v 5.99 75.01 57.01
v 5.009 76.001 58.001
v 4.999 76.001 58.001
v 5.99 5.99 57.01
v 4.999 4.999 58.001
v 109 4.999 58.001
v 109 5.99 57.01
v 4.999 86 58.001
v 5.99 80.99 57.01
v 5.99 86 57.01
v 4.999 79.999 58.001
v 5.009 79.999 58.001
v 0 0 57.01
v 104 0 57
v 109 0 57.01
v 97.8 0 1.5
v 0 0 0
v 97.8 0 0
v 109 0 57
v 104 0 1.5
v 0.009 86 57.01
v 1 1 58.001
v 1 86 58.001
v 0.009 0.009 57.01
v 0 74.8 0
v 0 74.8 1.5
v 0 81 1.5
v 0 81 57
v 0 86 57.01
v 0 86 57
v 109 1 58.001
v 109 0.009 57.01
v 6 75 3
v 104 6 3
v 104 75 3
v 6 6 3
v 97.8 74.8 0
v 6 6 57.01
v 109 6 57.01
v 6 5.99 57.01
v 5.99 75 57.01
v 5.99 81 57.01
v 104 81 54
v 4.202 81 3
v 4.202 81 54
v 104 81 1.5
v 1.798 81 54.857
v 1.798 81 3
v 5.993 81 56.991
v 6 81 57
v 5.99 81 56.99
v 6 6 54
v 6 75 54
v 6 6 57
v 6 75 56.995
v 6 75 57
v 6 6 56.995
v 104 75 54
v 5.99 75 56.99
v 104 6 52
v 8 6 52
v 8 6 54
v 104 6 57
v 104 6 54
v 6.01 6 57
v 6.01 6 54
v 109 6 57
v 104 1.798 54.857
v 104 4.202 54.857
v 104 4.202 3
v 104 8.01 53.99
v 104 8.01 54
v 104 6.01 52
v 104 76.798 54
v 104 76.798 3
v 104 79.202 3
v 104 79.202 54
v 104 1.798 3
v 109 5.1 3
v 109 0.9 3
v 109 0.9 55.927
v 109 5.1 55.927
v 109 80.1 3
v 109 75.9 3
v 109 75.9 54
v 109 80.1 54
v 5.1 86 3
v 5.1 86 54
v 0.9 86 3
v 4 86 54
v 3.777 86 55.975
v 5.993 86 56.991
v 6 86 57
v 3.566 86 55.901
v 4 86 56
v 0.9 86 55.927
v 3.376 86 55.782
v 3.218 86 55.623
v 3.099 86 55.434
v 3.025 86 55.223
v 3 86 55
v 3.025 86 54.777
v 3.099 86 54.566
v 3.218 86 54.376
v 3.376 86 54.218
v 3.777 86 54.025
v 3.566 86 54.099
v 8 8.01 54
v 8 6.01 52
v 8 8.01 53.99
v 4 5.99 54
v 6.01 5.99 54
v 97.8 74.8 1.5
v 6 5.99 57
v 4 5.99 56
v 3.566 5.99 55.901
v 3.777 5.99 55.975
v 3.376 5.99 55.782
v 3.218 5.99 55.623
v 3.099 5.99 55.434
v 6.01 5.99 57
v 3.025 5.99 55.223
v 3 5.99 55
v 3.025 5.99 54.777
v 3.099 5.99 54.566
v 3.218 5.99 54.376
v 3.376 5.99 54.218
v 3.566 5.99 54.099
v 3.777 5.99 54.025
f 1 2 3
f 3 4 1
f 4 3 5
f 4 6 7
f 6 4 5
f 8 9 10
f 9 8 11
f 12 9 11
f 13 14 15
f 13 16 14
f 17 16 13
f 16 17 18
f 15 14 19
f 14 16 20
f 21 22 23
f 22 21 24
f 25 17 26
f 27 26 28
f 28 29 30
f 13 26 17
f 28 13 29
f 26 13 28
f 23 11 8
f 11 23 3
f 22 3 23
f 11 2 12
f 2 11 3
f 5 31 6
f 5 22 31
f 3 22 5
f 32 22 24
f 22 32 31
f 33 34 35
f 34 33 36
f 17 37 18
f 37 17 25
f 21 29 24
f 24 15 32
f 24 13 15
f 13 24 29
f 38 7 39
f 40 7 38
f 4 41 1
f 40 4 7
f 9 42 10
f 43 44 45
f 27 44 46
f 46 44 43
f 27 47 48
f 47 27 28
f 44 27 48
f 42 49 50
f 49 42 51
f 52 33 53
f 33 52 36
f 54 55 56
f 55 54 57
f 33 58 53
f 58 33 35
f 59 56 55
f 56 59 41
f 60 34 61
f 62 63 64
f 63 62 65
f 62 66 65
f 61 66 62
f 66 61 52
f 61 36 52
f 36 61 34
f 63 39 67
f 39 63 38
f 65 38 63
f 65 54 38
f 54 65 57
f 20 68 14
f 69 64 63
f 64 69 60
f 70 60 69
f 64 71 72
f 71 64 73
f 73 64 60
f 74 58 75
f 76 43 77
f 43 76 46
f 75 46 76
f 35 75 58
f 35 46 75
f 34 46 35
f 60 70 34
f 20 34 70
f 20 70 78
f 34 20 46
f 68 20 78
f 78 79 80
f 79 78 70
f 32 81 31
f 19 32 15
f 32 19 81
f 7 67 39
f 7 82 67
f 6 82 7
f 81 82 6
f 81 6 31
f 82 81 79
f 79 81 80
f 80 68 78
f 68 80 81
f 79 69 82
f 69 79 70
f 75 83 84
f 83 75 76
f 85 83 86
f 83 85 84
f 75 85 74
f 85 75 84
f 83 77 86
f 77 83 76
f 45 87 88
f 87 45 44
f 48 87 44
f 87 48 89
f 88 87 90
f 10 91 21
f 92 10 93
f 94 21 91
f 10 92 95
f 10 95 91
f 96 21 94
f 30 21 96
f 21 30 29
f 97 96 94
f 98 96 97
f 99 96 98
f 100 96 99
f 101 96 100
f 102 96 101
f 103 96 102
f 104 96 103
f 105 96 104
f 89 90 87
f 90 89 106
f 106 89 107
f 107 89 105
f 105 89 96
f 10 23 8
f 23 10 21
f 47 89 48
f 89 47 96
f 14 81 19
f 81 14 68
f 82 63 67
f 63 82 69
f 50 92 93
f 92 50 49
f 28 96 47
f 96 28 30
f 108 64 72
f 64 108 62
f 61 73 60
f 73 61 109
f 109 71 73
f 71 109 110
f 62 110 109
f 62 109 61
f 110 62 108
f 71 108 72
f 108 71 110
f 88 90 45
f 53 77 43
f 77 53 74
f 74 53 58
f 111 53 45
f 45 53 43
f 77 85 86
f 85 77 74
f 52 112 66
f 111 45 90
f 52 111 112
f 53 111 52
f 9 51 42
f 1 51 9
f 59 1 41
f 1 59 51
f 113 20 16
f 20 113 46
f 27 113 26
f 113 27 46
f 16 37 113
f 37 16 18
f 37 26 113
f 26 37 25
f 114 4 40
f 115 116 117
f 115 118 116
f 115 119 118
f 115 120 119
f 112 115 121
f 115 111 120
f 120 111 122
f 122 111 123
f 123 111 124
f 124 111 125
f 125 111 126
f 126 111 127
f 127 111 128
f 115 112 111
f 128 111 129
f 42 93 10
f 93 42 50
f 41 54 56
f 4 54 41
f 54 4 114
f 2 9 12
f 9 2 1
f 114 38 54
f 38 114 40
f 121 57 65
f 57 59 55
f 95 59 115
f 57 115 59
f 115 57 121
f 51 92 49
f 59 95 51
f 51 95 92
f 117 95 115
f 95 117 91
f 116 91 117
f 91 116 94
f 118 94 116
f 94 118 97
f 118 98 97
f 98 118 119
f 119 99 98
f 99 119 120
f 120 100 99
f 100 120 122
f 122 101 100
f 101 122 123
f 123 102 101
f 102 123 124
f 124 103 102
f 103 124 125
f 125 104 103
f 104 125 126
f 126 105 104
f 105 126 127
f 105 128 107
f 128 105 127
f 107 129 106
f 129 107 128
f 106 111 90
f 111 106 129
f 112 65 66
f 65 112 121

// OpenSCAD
// ============================================================================
// cutlery_box.scad
// Graduated 3-chamber disposable-cutlery box (Option 3) — CUT-FROM-SOLID port
// of build_box.py, for a 120 x 120 x 120 mm printer (AOSEED).
//
// WHY THIS PORT EXISTS (the whole point):
//   The hand-mesh generator (build_box.py) could not keep the 1 mm rim chamfer
//   continuous across the female dovetail joints, because where a slot's flared
//   corner crosses the sloped chamfer it needs a true boolean intersection.
//   OpenSCAD HAS that boolean kernel, so here we do exactly the "cut-from-solid"
//   thing:
//      1. Build the ENTIRE box as ONE solid, WITH the chamfer already on it.
//      2. difference() out vertical dovetail prisms ( /_\ cross-section ),
//         running from just above the base plate up THROUGH the rim, to both
//         (a) form the sliding-dovetail joints, and
//         (b) split the box into 6 bed-sized pieces.
//   Because the cut is a real boolean through the already-chamfered solid, the
//   sloped chamfer<->slot edge is produced for free => the rim chamfer stays
//   CONTINUOUS across every joint, with none of the sliver hacks.
//
// ----------------------------------------------------------------------------
// HOW TO USE
//   In the app:  set `part` below (or use the Customizer dropdown), F5 to
//                preview, F6 to render, then File > Export > STL.
//   One piece (CLI):
//      openscad -o body_knife_A.stl -D 'part="knife_A"' cutlery_box.scad
//   ALL SIX (bash, run from this folder):
//      for p in knife_A knife_B fork_A fork_B spoon_A spoon_B; do \
//        openscad -o "body_$p.stl" -D "part=\"$p\"" cutlery_box.scad ; done
//   PNG preview of one piece:
//      openscad -o knife_B.png --imgsize=1400,1000 --autocenter --viewall \
//        -D 'part="knife_B"' cutlery_box.scad
//
//   Pieces are modelled in ASSEMBLED coordinates (floor-down, z=0 is the bed),
//   so importing all six STLs together shows the assembled box directly; your
//   slicer will auto-drop each one onto the plate for printing.
//
// BED SANITY: every piece is <= 120 mm in X, Y, Z.
//   Z = 58 mm. Widest piece = spoon at 117 mm (Y). A-halves reach 109 mm (X,
//   including the protruding dovetail key). All under 120.
//
// !! I could NOT run OpenSCAD to verify this file (no binary in my sandbox) !!
//   - The rim chamfer is a SMOOTH, true-45 bevel built from hull() frustums of
//     convex rectangles. Works in every OpenSCAD since ~2015 (incl. Homebrew
//     2021.01). No stepped staircase -- and, crucially, it makes box() a clean
//     well-formed solid so the per-part booleans resolve reliably (the old
//     14-slice staircase was fragile and CGAL was dropping the walls of the
//     interior parts, leaving only the key prisms => "floating boxes").
//   - roof() is still available behind USE_ROOF=true for those who have it
//     (2021.01+ snapshots); for THIS rectangular design it is identical, so it
//     is NOT required.
//   - After F6, check the console for "WARNING"/"not a valid 2-manifold".
//     If a tenon ever looks detached, bump EPS to 0.05.
// ============================================================================


/* [Part to render / export] */
part = "knife_A"; // [knife_A, knife_B, fork_A, fork_B, spoon_A, spoon_B, assembly]

/* [Chamfer method] */
// false = smooth hull() frustum bevel (default, any OpenSCAD); true = roof() (2021.01+)
USE_ROOF = false;

/* [Heights (mm)] */
BASE   = 3.0;     // floor / base-plate thickness
COMP_H = 55.0;    // interior wall height above the floor (cutlery stack depth)

/* [Walls (mm)] */
HOST_T   = 6.0;     // thickness of every wall (thick enough to host a dovetail)
HALF_LEN = 104.0;   // printed length of each half (A = near, B = far); <120 incl. key

/* [Chamber bays (mm)] */
N_COL     = 3;       // columns of cutlery per chamber
KNIFE_COL = 23.0;    // -> knife bay 69  (3 x 19 mm knives + play)
FORK_COL  = 33.0;    // -> fork  bay 99  (3 x 29 mm forks  + play)
SPOON_COL = 37.0;    // -> spoon bay 111 (3 x 34 mm spoons + play, trimmed <120)

/* [Dovetail joint (mm)] */
DT_DEPTH = 5.0;   // tail protrusion past the seam (male key depth)
DT_NECK  = 1.2;   // half-width at the seam face (narrow)
DT_FLARE = 2.1;   // half-width at the tip (wide -> locks)
DT_CLR   = 0.4;   // FLANK/seam slide clearance added to the female socket (do not change for fit)
DT_DEPTH_RELIEF = 0.3; // extra depth on the socket BACK only, so the tail tip never bottoms out

/* [Hidden-dovetail top cap / "hat" (mm)] */
// The dovetail otherwise shows its trapezoid outline on the TOP edge of the wall.
// To hide it, the MALE piece extends the wall's full-width top (chamfer included)
// across the key footprint -> a flush, continuous top. The FEMALE piece gets a
// matching top RECESS (cap footprint + CAP_CLR) so the cap drops straight in.
// Result: the top reads as one surface with a single straight seam line at the cap
// tip; the dovetail joinery lives entirely below the cap.
//
// SELF-SUPPORTING UNDERSIDE: the cap reaches the FULL wall width at the chamfer base
// (so the top edge reads as the wall extended, with NO recessed sliver on the outer
// face), and its underside is ONE planar ramp from the chamfer's OUTER CORNER
// (half-width HOST_T/2 at z = BODY_H-CHAMFER) down to the dovetail-neck half-width
// (CAP_FOOT) at CAP_SLANT_DEG from horizontal. No little horizontal step. The ramp
// reaching full width exactly at the chamfer base means "ramp top" == "chamfer base"
// (CAP_H is DERIVED). The FEMALE recess is the same ramp + CAP_CLR play.
// TRADEOFF: because the cap runs all the way to the outer corner, the female wall
// tapers to ~0 at z = BODY_H-CHAMFER -> a thin feather edge at the joint (gradual at
// CAP_SLANT_DEG, hidden inside the joint when assembled). Accepted per design intent.
CAP_SLANT_DEG = 50;     // cap underside ramp angle from horizontal (50 = self-supporting, long flare)
CAP_FOOT = DT_NECK;     // cap-underside half-width where it meets the dovetail neck
CAP_CLR = 0.3;          // slide clearance so the male cap seats into the female top recess

/* [Rim chamfer (mm)] */
CHAMFER = 1.0;    // 45-deg comfort break broken along the top wall edges

/* [Base half-lap / anti-warp (mm)] */
// Neighbouring base plates overlap as a HORIZONTAL half-lap (shiplap) at mid-base
// height, so corners stay coplanar (no lift/protrusion). Horizontal lap faces do
// NOT bind the vertical-drop assembly. Shingle direction: A->B and knife->fork->spoon.
LAP_LEN = 6;        // overlap past the A/B seam and the knife/fork seam
LAP_LEN_FS = 2;     // overlap past the fork/SPOON seam -- SMALLER: spoon is the
                    // tightest piece (117mm of the 120mm bed); a 6mm lap there
                    // would push spoon to 123mm. 2mm keeps spoon at 119mm.
LAP_Z   = BASE/2;   // 1.5 -- horizontal split height of the lap (bottom vs top half)
LAP_CLR = 0.2;      // in-plane clearance so the shelf isn't a press fit

/* [Lid — box features that receive a flat ORDERED clear sheet] */
// The lid itself is NOT printed: it's a flat ~2 mm PETG/Tritan sheet, bullnose-polished
// edges (r=LID_EDGE_R), ordered to size. We only model the box features that receive it.
LID_T            = 2.0;   // ordered sheet thickness
LID_EDGE_R       = 1.0;   // ordered sheet bullnose edge radius (for the sheet order spec)
LID_PLAY         = 0.4;   // total vertical play in the hinge groove (sheet + this)
LID_RECESS       = 2.0;   // lid TOP sits this far BELOW the rim, so the journal pocket is fully
                          // capped (rim caps the bullnose -> retains the lid when raised; tilt-in)
HINGE_AT_MINUS_X = true;  // hinge on the -x (303mm) end wall; clip on +x. (flip = mirror; default delivered)
// perimeter support ledge (lid underside rests on it at z = BODY_H-LID_T)
LEDGE_W          = 2.0;   // ledge inward protrusion (its underside ramps back at 45 deg -> self-supporting)
GROOVE_END_INSET = 0.0;   // groove reaches the corners but RUNS OUT smoothly there (no end-face / no
                          // exposed bore); GROOVE_TAPER sets the run-out length
GROOVE_TAPER     = 4.0;   // y-length over which the eased mouth tapers out at each groove end
// hinge journal (cut into the inner face of the hinge end wall, CONTINUOUS along the long edge)
GROOVE_DEPTH     = 3.0;   // 2mm lead-in slot + 1mm pocket radius -> journal sits 2mm back from the
                          // face so its cap clears the swing relief and RETAINS the lid
GROOVE_POCKET_R  = 1.0;   // journal half-cylinder radius (the bullnose sheet edge rolls in it)
// clip latch (one localized retainer, centered on the clip end wall)
CLIP_W           = 18.0;  // clip width
CLIP_LIP         = 0.4;   // retaining overhang (0.3 light .. 0.6 firm)
CLIP_RAMP_H      = 1.6;   // cam-ramp height above the rim (press-to-close)
// finger scallop (semicircular dish in the rim, centered on & aligned with the clip)
SCALLOP_W        = 16.0;  // scallop width
SCALLOP_DEPTH    = 6.0;   // how far it dishes down from the rim


/* [Hidden] */
EPS      = 0.01;          // tiny overlap so abutting solids fuse cleanly in CGAL
// Upper-chamber pieces (fork, spoon) were cut by a cell plane laid EXACTLY on the
// divider wall's far face (the lower chamber owns that wall). intersection() along a
// plane coincident with an existing box face makes CGAL leave a ZERO-THICKNESS copy
// of the wall face -> edge-manifold + "watertight" but degenerate (OpenSCAD shows it
// as a blue back-face; Tinkercad thickens it into a phantom block). SEAM_EPS nudges
// those cut planes a hair INTO the open bay so they no longer coincide with any box
// face -> no flap. 0.02 mm is physically nothing but is well clear of CGAL's tolerance.
SEAM_EPS = 0.02;
CUT_OVER = 1.0;           // how far dovetail cutters overshoot the rim (clean cut)

BODY_H    = BASE + COMP_H;     // 58  total height
END_WALL  = HOST_T;            // end walls are dovetail hosts too -> equally thick
TOTAL_LEN = 2 * HALF_LEN;      // 208 assembled length (end wall .. end wall)

// hidden-cap ramp geometry (derived).
//   CAP_HW    = cap MAX half-width = HOST_T/2 (the full wall edge) at the chamfer base.
//   CAP_RISE  = vertical height of the self-supporting CAP_SLANT_DEG underside ramp.
//   CAP_ZRAMP = where the cap reaches full width = the chamfer base (BODY_H-CHAMFER), so
//               the ramp runs straight to the chamfer OUTER CORNER (no horizontal step).
//   CAP_ZBOT  = cap bottom = ramp start; CAP_H derived from it (for reference/report).
//   CAP_ZRAMP_R = recess ramp top, shifted down by CAP_CLR so the recess ramp stays
//               parallel to the cap ramp with uniform play.
CAP_HW      = HOST_T/2;   // cap reaches the FULL wall edge at the chamfer base
CAP_RISE    = (CAP_HW - CAP_FOOT) * tan(CAP_SLANT_DEG);
CAP_ZRAMP   = BODY_H - CHAMFER;               // full width exactly at the chamfer base / outer corner
CAP_ZBOT    = CAP_ZRAMP - CAP_RISE;
CAP_H       = BODY_H - CAP_ZBOT;              // derived; reported
CAP_ZRAMP_R = CAP_ZRAMP;   // recess ramp ALSO tops at the chamfer corner (mirror the cap) -> no vertical lip
// sanity checks
assert(CAP_ZBOT > BASE + 1,
       "cap zone dips too low -- raise CAP_SLANT_DEG");
assert(CAP_HW >= DT_FLARE,
       "cap too narrow to cover the dovetail tail");

// NOTE: lid-derived constants are defined BELOW the Y-layout block, because some of
// them (INTERIOR_Y0/Y1, CLIP_CY) depend on OUTER_L / OUTER_R / EXT_W. See "lid derived".

// bay widths
KNIFE_BAY = N_COL * KNIFE_COL; // 69
FORK_BAY  = N_COL * FORK_COL;  // 99
SPOON_BAY = N_COL * SPOON_COL; // 111

// ---- Y layout (width direction): wall | bay | divider | bay | divider | bay | wall
KNIFE_Y0 = 0;
KNIFE_Y1 = HOST_T + KNIFE_BAY + HOST_T;        // 0..81   (outer wall + bay + divider)
FORK_Y0  = KNIFE_Y1;                           // 81
FORK_Y1  = FORK_Y0 + FORK_BAY + HOST_T;        // 81..186 (bay + divider)
SPOON_Y0 = FORK_Y1;                            // 186
SPOON_Y1 = SPOON_Y0 + SPOON_BAY + HOST_T;      // 186..303(bay + outer wall)
EXT_W    = SPOON_Y1;                           // 303 total width

// lengthwise wall Y-bands [y0,y1] (host the A/B dovetails) + their centers
OUTER_L  = [0, HOST_T];                                       // [0,6]    c=3
DIV_KF   = [HOST_T + KNIFE_BAY, HOST_T + KNIFE_BAY + HOST_T]; // [75,81]  c=78
DIV_FS   = [FORK_Y0 + FORK_BAY, FORK_Y0 + FORK_BAY + HOST_T]; // [180,186]c=183
OUTER_R  = [SPOON_Y1 - HOST_T, SPOON_Y1];                     // [297,303]c=300

// ---- lid derived ---- (placed AFTER OUTER_L/OUTER_R/EXT_W so nothing is forward-referenced)
LID_TOP_Z   = BODY_H - LID_RECESS;        // 56  lid TOP (recessed); rim z=58 rises LID_RECESS above it
LID_Z_UNDER = LID_TOP_Z - LID_T;          // 54  lid underside / ledge top / lowered-divider top
POCKET_CZ   = LID_TOP_Z - LID_T/2;        // 55  journal centre (lid mid) -> pocket top = LID_TOP_Z = capped
// hinge end-wall inner face x + inward direction; clip end-wall inner face x + inward dir
HINGE_INX   = HINGE_AT_MINUS_X ? END_WALL : TOTAL_LEN - END_WALL;       // 6  (default)
HINGE_IN    = HINGE_AT_MINUS_X ? 1 : -1;  // interior direction from the hinge wall (+x default)
CLIP_INX    = HINGE_AT_MINUS_X ? TOTAL_LEN - END_WALL : END_WALL;       // 202 (default)
CLIP_IN     = HINGE_AT_MINUS_X ? -1 : 1;  // interior direction from the clip wall (-x default)
POCKET_CX   = HINGE_INX - HINGE_IN*(GROOVE_DEPTH - GROOVE_POCKET_R);    // 5  pocket centre x (INTO the wall)
INTERIOR_Y0 = OUTER_L[1];                 // 6   inner face of the -y short wall
INTERIOR_Y1 = OUTER_R[0];                 // 297 inner face of the +y short wall
CLIP_CY     = EXT_W/2;                     // 151.5 clip/scallop centre (in the fork chamber)
assert(POCKET_CZ - GROOVE_POCKET_R > BASE + 1,
       "journal dips too low -- reduce LID_RECESS or LID_T");
assert(POCKET_CZ + GROOVE_POCKET_R <= LID_TOP_Z + EPS,
       "journal not capped -- lower the lid (raise LID_RECESS) or shrink GROOVE_POCKET_R");
// NOTE: with LID_RECESS the lid underside (and lowered dividers) sit BELOW CAP_ZBOT. That is
// intended: the inner dividers are cut flat below the cap zone (their hidden caps are removed,
// but the lid covers them); the perimeter/end-wall caps are untouched (full-height walls).

// the three OPEN bays are rectangular holes in the wall footprint:
//   footprint = outer rectangle MINUS these bays  (== the 6 walls; verified).
// The smooth chamfer is built from exactly this decomposition.
BAY_X0 = END_WALL;              // 6
BAY_X1 = TOTAL_LEN - END_WALL;  // 202
BAYS = [
    [BAY_X0, BAY_X1, HOST_T,   HOST_T + KNIFE_BAY],   // knife bay [6,202] x [6,75]
    [BAY_X0, BAY_X1, FORK_Y0,  FORK_Y0 + FORK_BAY],   // fork  bay [6,202] x [81,180]
    [BAY_X0, BAY_X1, SPOON_Y0, SPOON_Y0 + SPOON_BAY], // spoon bay [6,202] x [186,297]
];

YC_OUTL  = OUTER_L[0] + HOST_T/2;   // 3   outer-left wall center
YC_DIVKF = DIV_KF[0]  + HOST_T/2;   // 78  knife/fork divider center
YC_DIVFS = DIV_FS[0]  + HOST_T/2;   // 183 fork/spoon divider center
YC_OUTR  = OUTER_R[0] + HOST_T/2;   // 300 outer-right wall center

// seams
AB_SEAM = HALF_LEN;               // 104  A/B length seam (x)
SEAM_KF = FORK_Y0;                // 81   knife/fork width seam (y)
SEAM_FS = SPOON_Y0;              // 186  fork/spoon width seam (y)
ENDC_A  = END_WALL/2;             // 3    A end-wall center (x) -> chamber dovetails
ENDC_B  = TOTAL_LEN - END_WALL/2; // 205  B end-wall center (x)


// ============================================================================
// 2D wall footprint (cross-section of all walls, constant in z for the straight
// part). Union of: 2 full-width end walls + 4 lengthwise walls between them.
// ============================================================================
module wall_footprint_2d() {
    // footprint = outer rectangle minus the 3 open bays  (== the 6 walls)
    difference() {
        square([TOTAL_LEN, EXT_W]);
        for (b = BAYS) translate([b[0], b[2]]) square([b[1] - b[0], b[3] - b[2]]);
    }
}

// ============================================================================
// The full chamfered box solid = base plate + walls with a continuous 1 mm
// top-rim chamfer. Built ONCE; every piece is carved out of this.
// ============================================================================
module chamfer_cap() {
    // SMOOTH 45 rim chamfer over z[BODY_H-CHAMFER, BODY_H], in absolute coords.
    zm = BODY_H - CHAMFER;
    if (USE_ROOF) {
        // exact straight-skeleton roof, capped at CHAMFER height (needs roof()).
        intersection() {
            translate([0,0,zm]) roof() wall_footprint_2d();
            translate([0,0,zm]) linear_extrude(CHAMFER + EPS) wall_footprint_2d();
        }
    } else {
        // DEFAULT: true 45 bevel as hull() frustums of CONVEX rectangles -> smooth
        // AND a clean manifold.  Since footprint = outer - bays, the chamfer of the
        // footprint = (outer rectangle beveled inward) MINUS (each bay beveled so it
        // grows toward the top, which bevels every bay-facing rim).  All hull()s are
        // on convex rectangles, so nothing gets convex-filled.
        difference() {
            // outer perimeter frustum: full outer rect at zm -> inset by CHAMFER at top
            hull() {
                translate([0,0,zm])     linear_extrude(0.001) square([TOTAL_LEN, EXT_W]);
                translate([0,0,BODY_H]) linear_extrude(0.001) offset(delta=-CHAMFER) square([TOTAL_LEN, EXT_W]);
            }
            // each bay grows by CHAMFER toward the top -> bevels its surrounding rim.
            // (overshoots z a hair past both ends so the cut is clean.)
            for (b = BAYS)
                hull() {
                    translate([0,0,zm-EPS])     linear_extrude(0.001)
                        translate([b[0],b[2]]) offset(delta=-EPS)        square([b[1]-b[0], b[3]-b[2]]);
                    translate([0,0,BODY_H+EPS]) linear_extrude(0.001)
                        translate([b[0],b[2]]) offset(delta=CHAMFER+EPS) square([b[1]-b[0], b[3]-b[2]]);
                }
        }
    }
}

module box() {
    zm = BODY_H - CHAMFER;
    union() {
        cube([TOTAL_LEN, EXT_W, BASE]);                                        // base plate z[0,3]
        translate([0,0,BASE]) linear_extrude(zm - BASE + EPS) wall_footprint_2d(); // straight walls z[3,57]
        chamfer_cap();                                                         // smooth chamfer z[57,58]
    }
}

// ============================================================================
// Dovetail prisms ( /_\ ). Vertical, z[BASE, BODY_H+CUT_OVER] so they cut
// through the rim but leave the base plate continuous. The near face is pushed
// back EPS so a male key always fuses to its wall.
//   male key   : half_n=DT_NECK,         half_f=DT_FLARE
//   female slot: half_n=DT_NECK+DT_CLR,  half_f=DT_FLARE+DT_CLR
// ============================================================================
module dt_prism_X(seam_x, yc, half_n, half_f) {   // perpendicular to X, grows +X
    translate([0,0,BASE]) linear_extrude(BODY_H - BASE + CUT_OVER)
        polygon([[seam_x - EPS,        yc - half_n],
                 [seam_x + DT_DEPTH,   yc - half_f],
                 [seam_x + DT_DEPTH,   yc + half_f],
                 [seam_x - EPS,        yc + half_n]]);
}
module dt_prism_Y(seam_y, xc, half_n, half_f) {   // perpendicular to Y, grows +Y
    translate([0,0,BASE]) linear_extrude(BODY_H - BASE + CUT_OVER)
        polygon([[xc - half_n, seam_y - EPS],
                 [xc - half_f, seam_y + DT_DEPTH],
                 [xc + half_f, seam_y + DT_DEPTH],
                 [xc + half_n, seam_y - EPS]]);
}
module ab_key   (yc)        { dt_prism_X(AB_SEAM, yc, DT_NECK, DT_FLARE); }
module ch_key   (seam_y, xc){ dt_prism_Y(seam_y, xc, DT_NECK, DT_FLARE); }

// Female sockets = male + DT_CLR on the flanks/seam (unchanged), PLUS a straight
// back-face relief of DT_DEPTH_RELIEF so the tail tip never bottoms out. The
// relief is a rectangle tacked onto the trapezoid's tip at the SAME flare width,
// so the angled flank faces (and their 0.4 mm slide clearance) are untouched.
module ab_socket(yc) {
    dt_prism_X(AB_SEAM, yc, DT_NECK + DT_CLR, DT_FLARE + DT_CLR);
    translate([0,0,BASE]) linear_extrude(BODY_H - BASE + CUT_OVER)
        translate([AB_SEAM + DT_DEPTH, yc - (DT_FLARE + DT_CLR)])
            square([DT_DEPTH_RELIEF, 2*(DT_FLARE + DT_CLR)]);          // back relief, +X
}
module ch_socket(seam_y, xc) {
    dt_prism_Y(seam_y, xc, DT_NECK + DT_CLR, DT_FLARE + DT_CLR);
    translate([0,0,BASE]) linear_extrude(BODY_H - BASE + CUT_OVER)
        translate([xc - (DT_FLARE + DT_CLR), seam_y + DT_DEPTH])
            square([2*(DT_FLARE + DT_CLR), DT_DEPTH_RELIEF]);          // back relief, +Y
}

// ===== hidden-dovetail top cap ("hat"), SELF-SUPPORTING underside ===============
// MALE cap: a FULL-wall-width hat whose underside is ONE planar ramp from the chamfer's
// OUTER CORNER (half-width CAP_HW = HOST_T/2 at CAP_ZRAMP = BODY_H-CHAMFER) down to the
// dovetail-neck half-width (CAP_FOOT) at CAP_SLANT_DEG from horizontal -> the self-
// supporting shoulder, running straight to the corner (no horizontal step). Built as
// hull(narrow bottom slab buried in the tail neck, full-width top slab through the rim);
// box() trims it to the wall and adds the continuous rim chamfer for free, so the outer
// top edge reads as the wall extended (no recessed sliver). The protruding NOSE is left
// SQUARE (vertical) -- hidden in the female socket when assembled.
// TRADEOFF: the female wall tapers to ~0 at z=BODY_H-CHAMFER (a thin feather edge at the
// joint, gradual at CAP_SLANT_DEG) -- accepted per design intent.
module ab_cap(yc) {   // A/B seam, grows +X past the seam (length direction)
    hull() {
        translate([AB_SEAM - EPS, yc - CAP_FOOT, CAP_ZBOT])
            cube([DT_DEPTH + EPS, 2*CAP_FOOT, EPS]);
        translate([AB_SEAM - EPS, yc - CAP_HW,   CAP_ZRAMP])
            cube([DT_DEPTH + EPS, 2*CAP_HW, (BODY_H + CUT_OVER) - CAP_ZRAMP]);
    }
}
module ch_cap(seam_y, xc) {   // chamber seam, grows +Y past the seam (in the end wall)
    hull() {
        translate([xc - CAP_FOOT, seam_y - EPS, CAP_ZBOT])
            cube([2*CAP_FOOT, DT_DEPTH + EPS, EPS]);
        translate([xc - CAP_HW,   seam_y - EPS, CAP_ZRAMP])
            cube([2*CAP_HW, DT_DEPTH + EPS, (BODY_H + CUT_OVER) - CAP_ZRAMP]);
    }
}
// FEMALE recess: the SAME ramp grown by CAP_CLR (flanks, tip, floor, and ramp shifted down
// by CAP_CLR so it stays parallel) -> the cap seats with uniform slide clearance. It opens
// to the wall edge (and a hair past, into air) so the cap's full-width corner drops in;
// this is what leaves the thin female feather at the top (accepted). Open upward + toward seam.
module ab_cap_neg(yc) {
    hull() {
        translate([AB_SEAM - EPS, yc - (CAP_FOOT + CAP_CLR), CAP_ZBOT - CAP_CLR])
            cube([DT_DEPTH + CAP_CLR + EPS, 2*(CAP_FOOT + CAP_CLR), EPS]);
        translate([AB_SEAM - EPS, yc - (CAP_HW + EPS), CAP_ZRAMP_R])
            cube([DT_DEPTH + CAP_CLR + EPS, 2*(CAP_HW + EPS), (BODY_H + CUT_OVER + 1) - CAP_ZRAMP_R]);
    }
}
module ch_cap_neg(seam_y, xc) {
    hull() {
        translate([xc - (CAP_FOOT + CAP_CLR), seam_y - EPS, CAP_ZBOT - CAP_CLR])
            cube([2*(CAP_FOOT + CAP_CLR), DT_DEPTH + CAP_CLR + EPS, EPS]);
        translate([xc - (CAP_HW + EPS), seam_y - EPS, CAP_ZRAMP_R])
            cube([2*(CAP_HW + EPS), DT_DEPTH + CAP_CLR + EPS, (BODY_H + CUT_OVER + 1) - CAP_ZRAMP_R]);
    }
}

// rectangular cell (x[xa,xb], y[ya,yb], full height + margin) used to split pieces
module cell(xa, xb, ya, yb) {
    translate([xa, ya, -1]) cube([xb - xa, yb - ya, BODY_H + 11]);
}

// ===== base half-lap (shiplap) =================================================
// HORIZONTAL lap at mid-base height: the shelf-owner keeps its BOTTOM half
// (z 0..LAP_Z) extending LAP_LEN past the seam; the neighbour has its bottom half
// REMOVED there (keeps only the top half) and lands flat on the shelf. Horizontal
// faces => no binding during the vertical drop. Shelves live entirely in the base
// (z < BASE), well clear of the wall dovetails (z >= BASE).
// Shingle = FEMALE-first (matches the no-notch dovetail assembly order, which
// lowers the male piece onto the female): the B half owns the A/B shelf (grows
// -X into A) and the UPPER chamber (fork, spoon) owns the chamber shelf (grows
// -Y into the lower chamber).  Order: spoon, fork, knife; B before A.
module lap_shelf_X(y0, y1) {                 // B-side shelf, grows -X into A past AB_SEAM
    // +EPS past AB_SEAM so the shelf interpenetrates (not just abuts) its own B body -> fuses cleanly.
    translate([AB_SEAM - LAP_LEN, y0, 0]) cube([LAP_LEN + EPS, y1 - y0, LAP_Z]);
}
module lap_neg_X(y0, y1) {                   // A-side: remove bottom half to receive it
    translate([AB_SEAM - LAP_LEN - LAP_CLR, y0 - EPS, -EPS])
        cube([LAP_LEN + LAP_CLR + EPS, (y1 - y0) + 2*EPS, LAP_Z + EPS]);
}
module lap_shelf_Y(seam_y, x0, x1, ln=LAP_LEN) {   // upper-chamber shelf, grows -Y into lower
    // grows -Y by `ln` into the lower chamber AND +Y by 2*SEAM_EPS past the seam so it
    // always overlaps the (SEAM_EPS-nudged) body floor and stays fused -> no floating shelf.
    translate([x0, seam_y - ln, 0]) cube([x1 - x0, ln + 2*SEAM_EPS, LAP_Z]);
}
module lap_neg_Y(seam_y, x0, x1, ln=LAP_LEN) {     // lower-chamber: remove bottom half
    translate([x0 - EPS, seam_y - ln - LAP_CLR, -EPS])
        cube([(x1 - x0) + 2*EPS, ln + LAP_CLR + EPS, LAP_Z + EPS]);
}

// ============================================================================
// LID FEATURES (receive a flat ORDERED clear sheet; the sheet is not printed).
// All features live at the TOP (z >= ~52), ABOVE the dovetail engagement, the half-lap
// (z<1.5) and most of the hat, so the vertical-drop assembly and joints are untouched.
// EPS overlaps throughout; no coincident coplanar faces with the existing walls.
// Default orientation: HINGE on the -x end wall (A pieces), CLIP on the +x end wall
// (B pieces), clip+scallop centred on the fork (middle) chamber.
// ============================================================================

// --- perimeter support ledge: 45-deg self-supporting brackets; rest face at LID_Z_UNDER.
//     Runs along the CLIP end wall + the two short outer walls. (Hinge wall uses the groove.)
//     Built as hull(thin top edge, wall column) -> a triangular bracket whose underside is
//     a 45-deg ramp (prints floor-down with no support). ADDED to each piece (clipped by cell).
//     Each run is INSET by LEDGE_W from the perpendicular walls so the three brackets never
//     overlap at a corner and the wall's normal chamfer wraps every corner uninterrupted.
module lid_ledge() {
    cy0 = INTERIOR_Y0 + LEDGE_W;  cy1 = INTERIOR_Y1 - LEDGE_W;  cyl = cy1 - cy0;   // clip-run y span (inset)
    sx0 = END_WALL    + LEDGE_W;  sxl = (TOTAL_LEN - 2*END_WALL) - 2*LEDGE_W;       // short-run x span (inset)
    // clip end wall (x = CLIP_INX), bracket protrudes toward interior (CLIP_IN)
    hull() {
        translate([CLIP_INX + CLIP_IN*LEDGE_W, cy0, LID_Z_UNDER - EPS]) cube([EPS, cyl, EPS]);
        translate([CLIP_INX - EPS,             cy0, LID_Z_UNDER - LEDGE_W]) cube([2*EPS, cyl, LEDGE_W]);
    }
    // OUTER_L short wall (y = INTERIOR_Y0), bracket protrudes +y
    hull() {
        translate([sx0, INTERIOR_Y0 + LEDGE_W, LID_Z_UNDER - EPS]) cube([sxl, EPS, EPS]);
        translate([sx0, INTERIOR_Y0 - EPS,     LID_Z_UNDER - LEDGE_W]) cube([sxl, 2*EPS, LEDGE_W]);
    }
    // OUTER_R short wall (y = INTERIOR_Y1), bracket protrudes -y
    hull() {
        translate([sx0, INTERIOR_Y1 - LEDGE_W, LID_Z_UNDER - EPS]) cube([sxl, EPS, EPS]);
        translate([sx0, INTERIOR_Y1 - EPS,     LID_Z_UNDER - LEDGE_W]) cube([sxl, 2*EPS, LEDGE_W]);
    }
}

// --- hinge groove: ONE 2D cross-section (journal bore + lead-in slot + 45-deg swing ramp),
//     CAPPED at the recessed lid top (LID_TOP_Z), swept along the wall. At BOTH ends the whole
//     profile RUNS OUT smoothly -- it tapers to the inner-top rim corner (HINGE_INX, BODY_H) --
//     so there is NO end-face and NO exposed bore at the corners; the groove just fades into the
//     wall. The rim caps the bullnose (retains the lid, tilt-in); the 45-deg ramp is self-
//     supporting and gives the swing clearance; the cap stays full over the bullnose => retains.
module groove_profile() {                            // 2D cross-section in (x, z)
    union() {
        translate([POCKET_CX, POCKET_CZ]) circle(r = GROOVE_POCKET_R, $fn = 28);              // journal bore
        translate([POCKET_CX, LID_Z_UNDER]) square([HINGE_INX - POCKET_CX + EPS, LID_T]);     // lead-in slot
        polygon([[POCKET_CX, LID_TOP_Z], [HINGE_INX + EPS, LID_TOP_Z], [HINGE_INX + EPS, BODY_H - CHAMFER]]); // swing relief (below the rim chamfer)
        polygon([[HINGE_INX, BODY_H - CHAMFER], [HINGE_INX + EPS, BODY_H + EPS], [HINGE_INX - CHAMFER, BODY_H + EPS]]); // rim chamfer cut, CONTINUOUS through the divider junctions (no bulge)
    }
}
module groove_extrude(y0, y1) {                      // sweep the profile along the wall, y0..y1
    translate([0, y0, 0]) rotate([90,0,0]) translate([0,0,-(y1 - y0)]) linear_extrude(y1 - y0) groove_profile();
}
module hinge_groove() {
    // journal runs STRAIGHT to the end of the wall at each side; the perpendicular short wall
    // caps the bore there (no run-out). The EPS overlap tucks the bore end into the short wall.
    groove_extrude(INTERIOR_Y0 - EPS, INTERIOR_Y1 + EPS);
}

// --- lower the inner chamber dividers to the lid underside (mid-support, no sag).
//     Removes the divider top over the full length; outer walls keep full height.
module divider_lower() {
    // x-span is the CHAMBER BAY only [BAY_X0, BAY_X1] (+EPS overlap into the end walls so the
    // cut is manifold). The end/outer walls keep their full BODY_H tops; only the two INNER
    // dividers (DIV_KF, DIV_FS) are lowered.
    translate([BAY_X0 - EPS, DIV_KF[0], LID_Z_UNDER]) cube([BAY_X1 - BAY_X0 + 2*EPS, HOST_T, BODY_H - LID_Z_UNDER + CUT_OVER]);
    translate([BAY_X0 - EPS, DIV_FS[0], LID_Z_UNDER]) cube([BAY_X1 - BAY_X0 + 2*EPS, HOST_T, BODY_H - LID_Z_UNDER + CUT_OVER]);
}

// --- retaining clip (ADDED): a lip on the clip end wall, centred on CLIP_CY, that overhangs
//     the RECESSED lid top (LID_TOP_Z) by CLIP_LIP and holds it down. A lead-in ramp above the
//     lip (up to LID_TOP_Z+CLIP_RAMP_H, still below the rim) cams the lid under as it swings
//     closed. Anchored into the wall (x = CLIP_INX-CLIP_IN*HOST_T/2). Added AFTER the scallop
//     cut so the scallop never undercuts it. No longer protrudes above the rim.
module lid_clip() {
    translate([0, CLIP_CY - CLIP_W/2, 0]) rotate([90,0,0]) translate([0,0,-CLIP_W]) linear_extrude(CLIP_W)
        polygon([[CLIP_INX - CLIP_IN*HOST_T/2, LID_TOP_Z - 0.8],         // anchor low, into the wall (fuse)
                 [CLIP_INX + CLIP_IN*CLIP_LIP, LID_TOP_Z],               // lip tip: overhang over the lid top
                 [CLIP_INX + CLIP_IN*CLIP_LIP, LID_TOP_Z + 0.4],         // lip front
                 [CLIP_INX - CLIP_IN*HOST_T/2, LID_TOP_Z + CLIP_RAMP_H]]);// lead-in ramp up into the wall
}

// --- finger scallop (CUT): a semicircular dish in the rim's INNER edge at the clip, so a
//     fingertip reaches under the lid edge to release it. Interior half only (does not
//     touch the wall body or the clip's anchor).
module lid_scallop() {
    intersection() {
        translate([CLIP_INX, CLIP_CY, BODY_H - SCALLOP_DEPTH]) cylinder(h = SCALLOP_DEPTH + EPS, r = SCALLOP_W/2, $fn = 40);
        translate([CLIP_INX + (CLIP_IN<0 ? -SCALLOP_W : 0), CLIP_CY - SCALLOP_W, BODY_H - SCALLOP_DEPTH - EPS])
            cube([SCALLOP_W, 2*SCALLOP_W, SCALLOP_DEPTH + 2*EPS]);
    }
}

// ============================================================================
// The six pieces.  piece = intersection(box, cell + own male keys) - own sockets
//   A halves are MALE on the A/B seam (keep the key); B halves are FEMALE (slot).
//   On a chamber seam the LEFT chamber is male (+Y), the right chamber is female.
// ============================================================================
// Base half-lap shingling (FEMALE-first, Option 1):
//   A/B seam  -> the B half owns the bottom shelf (grows -X), A has the negative.
//   chamber   -> the UPPER chamber (fork, spoon) owns the shelf (grows -Y); the
//                lower chamber (knife, fork) has the negative.
//   Assembly order: spoon, fork, knife; B before A (male lowered onto female).
// Center crossings (104,81)&(104,186): the CHAMBER shelf (fork_A / spoon_A) owns the
//   crossing square; the B-half A/B shelf (knife_B / fork_B) is CLIPPED short of the
//   chamber seam by LAP_LEN so two shelves never collide.
module knife_A() {                                       // placed LAST; receives everything
    difference() {
        union() {
            intersection() {
                box();
                union() {
                    cell(-1, AB_SEAM, KNIFE_Y0 - 1, KNIFE_Y1);
                    ab_key(YC_OUTL); ab_key(YC_DIVKF); ch_key(SEAM_KF, ENDC_A);
                    ab_cap(YC_OUTL); ab_cap(YC_DIVKF); ch_cap(SEAM_KF, ENDC_A);  // hide tops (male)
                }
            }
            intersection() { lid_ledge(); cell(-1, AB_SEAM, KNIFE_Y0 - 1, KNIFE_Y1); }  // lid support ledge
        }
        lap_neg_X(KNIFE_Y0, KNIFE_Y1);            // receive knife_B's A/B shelf
        lap_neg_Y(SEAM_KF, 0, AB_SEAM);           // receive fork_A's chamber shelf
        hinge_groove(); divider_lower(); lid_scallop();   // lid cuts (groove hits A pieces; divider/scallop where present)
    }
}

module knife_B() {
    difference() {
        union() {
            intersection() {
                box();
                union() {
                    cell(AB_SEAM, TOTAL_LEN + 1, KNIFE_Y0 - 1, KNIFE_Y1);
                    ch_key(SEAM_KF, ENDC_B);
                    ch_cap(SEAM_KF, ENDC_B);                // hide top (male, chamber)
                }
            }
            lap_shelf_X(KNIFE_Y0, KNIFE_Y1 - LAP_LEN);  // A/B shelf -> knife_A (CLIPPED at y=81 crossing)
            intersection() { lid_ledge(); cell(AB_SEAM, TOTAL_LEN + 1, KNIFE_Y0 - 1, KNIFE_Y1); }  // lid support ledge
        }
        ab_socket(YC_OUTL); ab_socket(YC_DIVKF);
        ab_cap_neg(YC_OUTL); ab_cap_neg(YC_DIVKF);      // top recesses to receive knife_A's caps (female)
        lap_neg_Y(SEAM_KF, AB_SEAM, TOTAL_LEN);         // receive fork_B's chamber shelf
        hinge_groove(); divider_lower(); lid_scallop();   // lid cuts
    }
}

module fork_A() {
    difference() {
        union() {
            intersection() {
                box();
                union() {
                    cell(-1, AB_SEAM, FORK_Y0 + SEAM_EPS, FORK_Y1);  // -Y cut nudged off the divider face
                    ab_key(YC_DIVFS); ch_key(SEAM_FS, ENDC_A);
                    ab_cap(YC_DIVFS); ch_cap(SEAM_FS, ENDC_A);       // hide tops (male)
                }
            }
            lap_shelf_Y(SEAM_KF, 0, AB_SEAM);           // chamber shelf -> knife_A (owns crossing)
            intersection() { lid_ledge(); cell(-1, AB_SEAM, FORK_Y0 + SEAM_EPS, FORK_Y1); }  // lid support ledge (none in fork-A)
        }
        lap_neg_X(FORK_Y0, FORK_Y1);                    // receive fork_B's A/B shelf
        ch_socket(SEAM_KF, ENDC_A);
        ch_cap_neg(SEAM_KF, ENDC_A);                    // top recess to receive knife_A's chamber cap (female)
        lap_neg_Y(SEAM_FS, 0, AB_SEAM, LAP_LEN_FS);     // receive spoon_A's (small) chamber shelf
        hinge_groove(); divider_lower(); lid_scallop();   // lid cuts (groove = fork-A hinge segment; divider = DIV_FS)
    }
}

module fork_B() {
    union() {
        difference() {
            union() {
                intersection() {
                    box();
                    union() {
                        cell(AB_SEAM, TOTAL_LEN + 1, FORK_Y0 + SEAM_EPS, FORK_Y1);  // -Y cut nudged off the divider face
                        ch_key(SEAM_FS, ENDC_B);
                        ch_cap(SEAM_FS, ENDC_B);                // hide top (male, chamber)
                    }
                }
                lap_shelf_X(FORK_Y0, FORK_Y1 - LAP_LEN_FS); // A/B shelf -> fork_A (CLIPPED at y=186 crossing)
                lap_shelf_Y(SEAM_KF, AB_SEAM, TOTAL_LEN);   // chamber shelf -> knife_B
                intersection() { lid_ledge(); cell(AB_SEAM, TOTAL_LEN + 1, FORK_Y0 + SEAM_EPS, FORK_Y1); }  // lid ledge (clip-end run)
            }
            ab_socket(YC_DIVFS);
            ab_cap_neg(YC_DIVFS);                           // top recess to receive fork_A's A/B cap (female)
            ch_socket(SEAM_KF, ENDC_B);
            ch_cap_neg(SEAM_KF, ENDC_B);                    // top recess to receive knife_B's chamber cap (female)
            lap_neg_Y(SEAM_FS, AB_SEAM, TOTAL_LEN, LAP_LEN_FS); // receive spoon_B's (small) chamber shelf
            hinge_groove(); divider_lower(); lid_scallop();     // lid cuts (scallop lands here)
        }
        intersection() { lid_clip(); cell(AB_SEAM, TOTAL_LEN + 1, FORK_Y0 + SEAM_EPS, FORK_Y1); }  // retaining clip, added AFTER the scallop cut
    }
}

module spoon_A() {
    difference() {
        union() {
            intersection() {
                box();
                union() {
                    cell(-1, AB_SEAM, SPOON_Y0 + SEAM_EPS, SPOON_Y1 + 1);  // -Y cut nudged off the divider face
                    ab_key(YC_OUTR);
                    ab_cap(YC_OUTR);                        // hide top (male)
                }
            }
            lap_shelf_Y(SEAM_FS, 0, AB_SEAM, LAP_LEN_FS); // chamber shelf -> fork_A (small; owns crossing)
            intersection() { lid_ledge(); cell(-1, AB_SEAM, SPOON_Y0 + SEAM_EPS, SPOON_Y1 + 1); }  // lid support ledge (OUTER_R run)
        }
        lap_neg_X(SPOON_Y0, SPOON_Y1);                  // receive spoon_B's A/B shelf
        ch_socket(SEAM_FS, ENDC_A);
        ch_cap_neg(SEAM_FS, ENDC_A);                    // top recess to receive fork_A's chamber cap (female)
        hinge_groove(); divider_lower(); lid_scallop();   // lid cuts (groove = spoon-A hinge segment)
    }
}

module spoon_B() {                                      // placed FIRST; owns shelves
    difference() {
        union() {
            intersection() {
                box();
                union() {
                    cell(AB_SEAM, TOTAL_LEN + 1, SPOON_Y0 + SEAM_EPS, SPOON_Y1 + 1);  // -Y cut nudged off the divider face
                }
            }
            lap_shelf_X(SPOON_Y0, SPOON_Y1);            // A/B shelf -> spoon_A
            lap_shelf_Y(SEAM_FS, AB_SEAM, TOTAL_LEN, LAP_LEN_FS); // chamber shelf -> fork_B (small)
            intersection() { lid_ledge(); cell(AB_SEAM, TOTAL_LEN + 1, SPOON_Y0 + SEAM_EPS, SPOON_Y1 + 1); }  // lid ledge (OUTER_R + clip-end runs)
        }
        ab_socket(YC_OUTR);
        ab_cap_neg(YC_OUTR);                            // top recess to receive spoon_A's A/B cap (female)
        ch_socket(SEAM_FS, ENDC_B);
        ch_cap_neg(SEAM_FS, ENDC_B);                    // top recess to receive fork_B's chamber cap (female)
        hinge_groove(); divider_lower(); lid_scallop();   // lid cuts
    }
}

// Fast preview: the full continuous-chamfer box (no cuts). The six part modules
// above are the real, separable pieces. To instead see the TRUE assembled
// pieces with their joints (slower — 6 booleans), replace box(); below with:
//   knife_A(); knife_B(); fork_A(); fork_B(); spoon_A(); spoon_B();
module assembly() {
    box();
}

// ============================================================================
// Render dispatch
// ============================================================================
if      (part == "knife_A")  knife_A();
else if (part == "knife_B")  knife_B();
else if (part == "fork_A")   fork_A();
else if (part == "fork_B")   fork_B();
else if (part == "spoon_A")  spoon_A();
else if (part == "spoon_B")  spoon_B();
else if (part == "assembly") assembly();
else echo(str("Unknown part: ", part));
